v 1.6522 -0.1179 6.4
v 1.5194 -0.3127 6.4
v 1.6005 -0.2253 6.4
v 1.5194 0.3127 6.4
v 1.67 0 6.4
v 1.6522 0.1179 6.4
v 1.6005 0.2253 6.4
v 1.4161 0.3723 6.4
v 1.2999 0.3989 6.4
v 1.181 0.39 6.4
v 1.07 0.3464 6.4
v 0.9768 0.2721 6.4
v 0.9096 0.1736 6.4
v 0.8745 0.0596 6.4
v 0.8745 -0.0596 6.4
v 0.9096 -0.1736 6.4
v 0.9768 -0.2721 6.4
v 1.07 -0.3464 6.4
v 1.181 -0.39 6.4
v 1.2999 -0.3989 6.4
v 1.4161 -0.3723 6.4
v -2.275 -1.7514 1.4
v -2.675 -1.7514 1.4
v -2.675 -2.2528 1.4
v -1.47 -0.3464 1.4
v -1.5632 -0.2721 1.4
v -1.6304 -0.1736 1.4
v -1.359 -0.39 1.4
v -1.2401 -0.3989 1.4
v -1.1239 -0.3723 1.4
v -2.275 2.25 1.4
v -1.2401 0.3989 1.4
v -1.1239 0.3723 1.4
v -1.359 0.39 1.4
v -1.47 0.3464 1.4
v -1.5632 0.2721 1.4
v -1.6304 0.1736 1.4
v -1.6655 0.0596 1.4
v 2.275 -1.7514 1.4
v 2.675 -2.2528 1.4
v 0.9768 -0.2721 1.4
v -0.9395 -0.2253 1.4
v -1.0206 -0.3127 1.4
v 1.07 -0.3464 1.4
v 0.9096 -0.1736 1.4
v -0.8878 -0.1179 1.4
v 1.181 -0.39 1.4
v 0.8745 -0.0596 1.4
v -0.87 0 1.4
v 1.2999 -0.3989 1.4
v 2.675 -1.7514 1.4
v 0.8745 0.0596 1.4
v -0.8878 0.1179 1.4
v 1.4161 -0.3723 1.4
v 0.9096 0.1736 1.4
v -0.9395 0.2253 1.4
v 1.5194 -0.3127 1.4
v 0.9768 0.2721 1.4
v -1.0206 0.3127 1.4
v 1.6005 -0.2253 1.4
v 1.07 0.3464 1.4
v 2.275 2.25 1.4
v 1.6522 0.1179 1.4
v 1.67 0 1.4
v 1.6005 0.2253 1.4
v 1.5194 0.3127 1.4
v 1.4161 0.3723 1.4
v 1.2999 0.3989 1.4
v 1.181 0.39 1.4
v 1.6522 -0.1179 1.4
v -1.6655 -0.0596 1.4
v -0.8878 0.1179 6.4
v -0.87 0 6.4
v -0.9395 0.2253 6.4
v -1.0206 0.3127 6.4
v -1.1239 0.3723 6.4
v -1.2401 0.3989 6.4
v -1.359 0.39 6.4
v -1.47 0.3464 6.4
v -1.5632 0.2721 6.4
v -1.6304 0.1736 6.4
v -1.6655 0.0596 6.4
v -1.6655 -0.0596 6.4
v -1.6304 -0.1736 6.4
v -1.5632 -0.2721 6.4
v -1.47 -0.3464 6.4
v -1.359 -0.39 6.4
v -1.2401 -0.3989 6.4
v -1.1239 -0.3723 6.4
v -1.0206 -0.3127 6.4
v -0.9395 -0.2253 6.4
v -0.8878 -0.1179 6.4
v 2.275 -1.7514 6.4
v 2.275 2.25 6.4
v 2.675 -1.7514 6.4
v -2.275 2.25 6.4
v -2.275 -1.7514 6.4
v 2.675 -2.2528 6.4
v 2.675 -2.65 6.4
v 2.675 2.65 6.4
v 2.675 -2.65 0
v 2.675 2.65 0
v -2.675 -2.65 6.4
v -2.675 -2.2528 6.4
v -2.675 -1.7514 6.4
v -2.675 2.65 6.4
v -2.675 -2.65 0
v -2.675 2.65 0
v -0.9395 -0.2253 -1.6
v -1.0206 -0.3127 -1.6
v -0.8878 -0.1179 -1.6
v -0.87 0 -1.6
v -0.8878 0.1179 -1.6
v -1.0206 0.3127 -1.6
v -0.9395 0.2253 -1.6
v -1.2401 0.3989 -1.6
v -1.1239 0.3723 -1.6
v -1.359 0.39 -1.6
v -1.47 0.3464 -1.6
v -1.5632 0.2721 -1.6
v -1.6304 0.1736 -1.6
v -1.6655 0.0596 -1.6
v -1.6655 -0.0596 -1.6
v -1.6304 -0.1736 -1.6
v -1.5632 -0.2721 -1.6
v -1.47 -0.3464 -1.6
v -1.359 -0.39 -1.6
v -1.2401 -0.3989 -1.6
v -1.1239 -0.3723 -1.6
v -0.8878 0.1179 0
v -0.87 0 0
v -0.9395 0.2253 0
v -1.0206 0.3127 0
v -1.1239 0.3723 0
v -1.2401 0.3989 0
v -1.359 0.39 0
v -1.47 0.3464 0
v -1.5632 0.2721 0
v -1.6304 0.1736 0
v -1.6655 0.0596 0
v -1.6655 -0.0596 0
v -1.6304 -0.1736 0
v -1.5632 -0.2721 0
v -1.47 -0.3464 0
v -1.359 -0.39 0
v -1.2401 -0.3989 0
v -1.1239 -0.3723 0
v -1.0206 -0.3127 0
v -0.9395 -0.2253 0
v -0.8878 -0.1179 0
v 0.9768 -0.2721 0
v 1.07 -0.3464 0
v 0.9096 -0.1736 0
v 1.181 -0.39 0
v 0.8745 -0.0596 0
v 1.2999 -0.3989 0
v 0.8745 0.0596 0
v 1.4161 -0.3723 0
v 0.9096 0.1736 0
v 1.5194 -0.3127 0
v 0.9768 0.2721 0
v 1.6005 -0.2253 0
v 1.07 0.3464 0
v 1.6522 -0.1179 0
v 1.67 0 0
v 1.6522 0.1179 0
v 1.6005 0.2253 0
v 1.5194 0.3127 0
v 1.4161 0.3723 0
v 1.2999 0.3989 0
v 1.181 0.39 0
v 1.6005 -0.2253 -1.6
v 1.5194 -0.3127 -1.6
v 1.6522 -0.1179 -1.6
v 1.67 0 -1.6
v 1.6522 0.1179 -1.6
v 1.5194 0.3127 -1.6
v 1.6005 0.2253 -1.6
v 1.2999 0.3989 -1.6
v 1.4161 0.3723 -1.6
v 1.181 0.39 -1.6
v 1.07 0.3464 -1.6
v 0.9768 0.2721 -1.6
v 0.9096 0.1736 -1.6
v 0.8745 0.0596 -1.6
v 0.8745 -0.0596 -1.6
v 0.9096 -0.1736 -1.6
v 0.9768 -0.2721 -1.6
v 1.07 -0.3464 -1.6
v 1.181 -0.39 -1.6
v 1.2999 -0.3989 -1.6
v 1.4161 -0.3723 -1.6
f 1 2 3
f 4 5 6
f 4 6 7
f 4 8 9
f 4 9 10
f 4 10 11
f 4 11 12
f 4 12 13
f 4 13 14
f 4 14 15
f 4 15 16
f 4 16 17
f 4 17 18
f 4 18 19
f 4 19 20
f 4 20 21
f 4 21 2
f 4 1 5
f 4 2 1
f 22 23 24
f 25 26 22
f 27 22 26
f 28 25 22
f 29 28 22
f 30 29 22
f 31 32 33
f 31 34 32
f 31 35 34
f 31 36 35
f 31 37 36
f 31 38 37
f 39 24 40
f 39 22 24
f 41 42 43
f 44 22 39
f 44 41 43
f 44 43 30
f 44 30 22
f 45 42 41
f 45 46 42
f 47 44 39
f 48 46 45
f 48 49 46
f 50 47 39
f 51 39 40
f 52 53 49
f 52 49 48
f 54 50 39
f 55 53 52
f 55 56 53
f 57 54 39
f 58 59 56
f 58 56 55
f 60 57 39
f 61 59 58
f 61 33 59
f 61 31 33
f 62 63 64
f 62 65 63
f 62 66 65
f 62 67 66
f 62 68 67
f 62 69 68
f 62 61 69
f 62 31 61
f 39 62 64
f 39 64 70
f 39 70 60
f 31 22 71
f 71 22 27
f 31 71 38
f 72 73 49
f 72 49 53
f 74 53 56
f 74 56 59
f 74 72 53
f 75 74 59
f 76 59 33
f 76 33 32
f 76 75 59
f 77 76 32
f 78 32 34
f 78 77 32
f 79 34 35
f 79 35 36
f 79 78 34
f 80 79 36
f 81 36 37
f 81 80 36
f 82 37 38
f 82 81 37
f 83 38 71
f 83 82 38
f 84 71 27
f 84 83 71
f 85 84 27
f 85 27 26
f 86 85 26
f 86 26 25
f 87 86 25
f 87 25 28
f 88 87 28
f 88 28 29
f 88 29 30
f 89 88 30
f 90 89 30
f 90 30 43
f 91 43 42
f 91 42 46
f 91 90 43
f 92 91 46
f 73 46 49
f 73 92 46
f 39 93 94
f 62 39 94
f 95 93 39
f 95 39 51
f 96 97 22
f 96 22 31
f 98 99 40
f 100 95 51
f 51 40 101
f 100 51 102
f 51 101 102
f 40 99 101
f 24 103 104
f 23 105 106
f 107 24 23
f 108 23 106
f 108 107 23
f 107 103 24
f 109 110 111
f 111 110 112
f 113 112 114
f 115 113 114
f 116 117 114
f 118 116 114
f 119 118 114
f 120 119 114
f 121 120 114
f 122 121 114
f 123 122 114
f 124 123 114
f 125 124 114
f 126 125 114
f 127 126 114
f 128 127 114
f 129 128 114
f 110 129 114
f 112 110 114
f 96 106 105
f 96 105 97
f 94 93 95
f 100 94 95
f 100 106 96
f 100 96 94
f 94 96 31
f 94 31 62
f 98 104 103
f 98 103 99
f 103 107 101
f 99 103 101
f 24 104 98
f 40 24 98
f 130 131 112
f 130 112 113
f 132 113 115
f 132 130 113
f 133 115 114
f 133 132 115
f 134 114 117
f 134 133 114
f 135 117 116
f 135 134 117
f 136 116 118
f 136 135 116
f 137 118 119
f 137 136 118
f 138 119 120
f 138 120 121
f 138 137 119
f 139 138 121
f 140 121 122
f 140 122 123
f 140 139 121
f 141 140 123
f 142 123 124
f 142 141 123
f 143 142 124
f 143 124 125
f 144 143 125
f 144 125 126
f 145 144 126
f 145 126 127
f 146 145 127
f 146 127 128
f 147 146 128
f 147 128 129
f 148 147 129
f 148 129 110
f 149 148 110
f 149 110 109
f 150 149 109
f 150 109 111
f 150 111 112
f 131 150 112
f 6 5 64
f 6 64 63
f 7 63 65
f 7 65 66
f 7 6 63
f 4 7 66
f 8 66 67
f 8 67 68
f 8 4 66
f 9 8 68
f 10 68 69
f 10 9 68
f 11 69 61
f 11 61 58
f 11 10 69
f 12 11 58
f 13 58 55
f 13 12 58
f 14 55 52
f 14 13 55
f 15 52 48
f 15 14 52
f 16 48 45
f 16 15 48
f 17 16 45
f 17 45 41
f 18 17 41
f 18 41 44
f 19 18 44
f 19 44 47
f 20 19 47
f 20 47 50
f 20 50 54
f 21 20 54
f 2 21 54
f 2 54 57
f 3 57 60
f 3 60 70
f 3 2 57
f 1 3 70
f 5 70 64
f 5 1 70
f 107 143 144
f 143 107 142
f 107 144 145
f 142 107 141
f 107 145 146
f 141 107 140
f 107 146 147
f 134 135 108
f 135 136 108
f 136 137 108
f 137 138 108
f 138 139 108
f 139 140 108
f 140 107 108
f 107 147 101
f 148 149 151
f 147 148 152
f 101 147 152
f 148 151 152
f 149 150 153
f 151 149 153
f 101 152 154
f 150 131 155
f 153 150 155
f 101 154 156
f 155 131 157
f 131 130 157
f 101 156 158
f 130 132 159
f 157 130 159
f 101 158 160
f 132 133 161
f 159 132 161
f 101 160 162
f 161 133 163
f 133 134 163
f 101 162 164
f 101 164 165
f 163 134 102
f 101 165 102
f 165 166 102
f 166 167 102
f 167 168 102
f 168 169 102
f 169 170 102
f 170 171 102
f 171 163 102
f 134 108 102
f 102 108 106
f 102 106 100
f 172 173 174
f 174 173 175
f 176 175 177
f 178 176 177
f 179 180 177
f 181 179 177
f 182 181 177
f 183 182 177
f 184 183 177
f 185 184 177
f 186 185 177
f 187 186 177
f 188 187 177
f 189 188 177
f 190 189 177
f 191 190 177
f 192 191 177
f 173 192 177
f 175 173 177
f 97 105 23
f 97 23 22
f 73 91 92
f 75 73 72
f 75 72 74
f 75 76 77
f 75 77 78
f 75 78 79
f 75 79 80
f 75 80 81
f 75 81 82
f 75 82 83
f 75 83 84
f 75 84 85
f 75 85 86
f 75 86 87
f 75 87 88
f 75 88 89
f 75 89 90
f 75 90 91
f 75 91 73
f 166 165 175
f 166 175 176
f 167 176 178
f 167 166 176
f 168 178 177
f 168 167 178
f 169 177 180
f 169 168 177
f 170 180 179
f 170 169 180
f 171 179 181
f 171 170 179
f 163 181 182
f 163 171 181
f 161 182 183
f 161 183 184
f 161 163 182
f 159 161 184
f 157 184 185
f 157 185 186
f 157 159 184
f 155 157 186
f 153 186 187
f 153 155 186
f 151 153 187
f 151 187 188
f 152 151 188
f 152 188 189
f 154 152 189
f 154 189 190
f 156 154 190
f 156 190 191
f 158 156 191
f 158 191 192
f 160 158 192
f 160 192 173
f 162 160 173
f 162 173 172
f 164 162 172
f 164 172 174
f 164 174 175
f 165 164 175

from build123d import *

# Parameters (mm, degrees)
SKETCH_1_W          = 5.35
SKETCH_1_H          = 5.3
EXTRUDE_1_DEPTH     = 6.4
SKETCH_2_W          = 4.55
SKETCH_2_H          = 4.5
SKETCH_2_R          = 0.4
CUT_EXTRUDE_1_DEPTH = 5
SKETCH_3_W          = 12.899416502
SKETCH_3_H          = 0.501475964
CUT_EXTRUDE_2_DEPTH = 5
SKETCH_4_R          = 0.4
EXTRUDE_2_DEPTH     = 8


with BuildPart() as part:
    # Эскиз1 → Вытянуть1 (new body)
    with BuildSketch(Plane.XY):
        Rectangle(SKETCH_1_W, SKETCH_1_H)
    extrude(amount=EXTRUDE_1_DEPTH)

    # Эскиз2 → Вырез-Вытянуть1 (cut)
    with BuildSketch(Plane.XY.offset(6.4)):
        Rectangle(SKETCH_2_W, SKETCH_2_H)
        with Locations((-1.27, 0)):
            Circle(SKETCH_2_R, mode=Mode.SUBTRACT)
        with Locations((1.27, 0)):
            Circle(SKETCH_2_R, mode=Mode.SUBTRACT)
    extrude(amount=-CUT_EXTRUDE_1_DEPTH, mode=Mode.SUBTRACT)

    # Эскиз3 → Вырез-Вытянуть2 (cut)
    with BuildSketch(Plane.XY.offset(6.4)):
        with Locations((-0.066925705, -2.002104797)):
            Rectangle(SKETCH_3_W, SKETCH_3_H)
    extrude(amount=-CUT_EXTRUDE_2_DEPTH, mode=Mode.SUBTRACT)

    # Эскиз4 → Вытянуть2 (add)
    with BuildSketch(Plane.XY.offset(6.4)):
        with Locations((-1.27, 0)):
            Circle(SKETCH_4_R)
        with Locations((1.27, 0)):
            Circle(SKETCH_4_R)
    extrude(amount=-EXTRUDE_2_DEPTH)


solid = part.part
